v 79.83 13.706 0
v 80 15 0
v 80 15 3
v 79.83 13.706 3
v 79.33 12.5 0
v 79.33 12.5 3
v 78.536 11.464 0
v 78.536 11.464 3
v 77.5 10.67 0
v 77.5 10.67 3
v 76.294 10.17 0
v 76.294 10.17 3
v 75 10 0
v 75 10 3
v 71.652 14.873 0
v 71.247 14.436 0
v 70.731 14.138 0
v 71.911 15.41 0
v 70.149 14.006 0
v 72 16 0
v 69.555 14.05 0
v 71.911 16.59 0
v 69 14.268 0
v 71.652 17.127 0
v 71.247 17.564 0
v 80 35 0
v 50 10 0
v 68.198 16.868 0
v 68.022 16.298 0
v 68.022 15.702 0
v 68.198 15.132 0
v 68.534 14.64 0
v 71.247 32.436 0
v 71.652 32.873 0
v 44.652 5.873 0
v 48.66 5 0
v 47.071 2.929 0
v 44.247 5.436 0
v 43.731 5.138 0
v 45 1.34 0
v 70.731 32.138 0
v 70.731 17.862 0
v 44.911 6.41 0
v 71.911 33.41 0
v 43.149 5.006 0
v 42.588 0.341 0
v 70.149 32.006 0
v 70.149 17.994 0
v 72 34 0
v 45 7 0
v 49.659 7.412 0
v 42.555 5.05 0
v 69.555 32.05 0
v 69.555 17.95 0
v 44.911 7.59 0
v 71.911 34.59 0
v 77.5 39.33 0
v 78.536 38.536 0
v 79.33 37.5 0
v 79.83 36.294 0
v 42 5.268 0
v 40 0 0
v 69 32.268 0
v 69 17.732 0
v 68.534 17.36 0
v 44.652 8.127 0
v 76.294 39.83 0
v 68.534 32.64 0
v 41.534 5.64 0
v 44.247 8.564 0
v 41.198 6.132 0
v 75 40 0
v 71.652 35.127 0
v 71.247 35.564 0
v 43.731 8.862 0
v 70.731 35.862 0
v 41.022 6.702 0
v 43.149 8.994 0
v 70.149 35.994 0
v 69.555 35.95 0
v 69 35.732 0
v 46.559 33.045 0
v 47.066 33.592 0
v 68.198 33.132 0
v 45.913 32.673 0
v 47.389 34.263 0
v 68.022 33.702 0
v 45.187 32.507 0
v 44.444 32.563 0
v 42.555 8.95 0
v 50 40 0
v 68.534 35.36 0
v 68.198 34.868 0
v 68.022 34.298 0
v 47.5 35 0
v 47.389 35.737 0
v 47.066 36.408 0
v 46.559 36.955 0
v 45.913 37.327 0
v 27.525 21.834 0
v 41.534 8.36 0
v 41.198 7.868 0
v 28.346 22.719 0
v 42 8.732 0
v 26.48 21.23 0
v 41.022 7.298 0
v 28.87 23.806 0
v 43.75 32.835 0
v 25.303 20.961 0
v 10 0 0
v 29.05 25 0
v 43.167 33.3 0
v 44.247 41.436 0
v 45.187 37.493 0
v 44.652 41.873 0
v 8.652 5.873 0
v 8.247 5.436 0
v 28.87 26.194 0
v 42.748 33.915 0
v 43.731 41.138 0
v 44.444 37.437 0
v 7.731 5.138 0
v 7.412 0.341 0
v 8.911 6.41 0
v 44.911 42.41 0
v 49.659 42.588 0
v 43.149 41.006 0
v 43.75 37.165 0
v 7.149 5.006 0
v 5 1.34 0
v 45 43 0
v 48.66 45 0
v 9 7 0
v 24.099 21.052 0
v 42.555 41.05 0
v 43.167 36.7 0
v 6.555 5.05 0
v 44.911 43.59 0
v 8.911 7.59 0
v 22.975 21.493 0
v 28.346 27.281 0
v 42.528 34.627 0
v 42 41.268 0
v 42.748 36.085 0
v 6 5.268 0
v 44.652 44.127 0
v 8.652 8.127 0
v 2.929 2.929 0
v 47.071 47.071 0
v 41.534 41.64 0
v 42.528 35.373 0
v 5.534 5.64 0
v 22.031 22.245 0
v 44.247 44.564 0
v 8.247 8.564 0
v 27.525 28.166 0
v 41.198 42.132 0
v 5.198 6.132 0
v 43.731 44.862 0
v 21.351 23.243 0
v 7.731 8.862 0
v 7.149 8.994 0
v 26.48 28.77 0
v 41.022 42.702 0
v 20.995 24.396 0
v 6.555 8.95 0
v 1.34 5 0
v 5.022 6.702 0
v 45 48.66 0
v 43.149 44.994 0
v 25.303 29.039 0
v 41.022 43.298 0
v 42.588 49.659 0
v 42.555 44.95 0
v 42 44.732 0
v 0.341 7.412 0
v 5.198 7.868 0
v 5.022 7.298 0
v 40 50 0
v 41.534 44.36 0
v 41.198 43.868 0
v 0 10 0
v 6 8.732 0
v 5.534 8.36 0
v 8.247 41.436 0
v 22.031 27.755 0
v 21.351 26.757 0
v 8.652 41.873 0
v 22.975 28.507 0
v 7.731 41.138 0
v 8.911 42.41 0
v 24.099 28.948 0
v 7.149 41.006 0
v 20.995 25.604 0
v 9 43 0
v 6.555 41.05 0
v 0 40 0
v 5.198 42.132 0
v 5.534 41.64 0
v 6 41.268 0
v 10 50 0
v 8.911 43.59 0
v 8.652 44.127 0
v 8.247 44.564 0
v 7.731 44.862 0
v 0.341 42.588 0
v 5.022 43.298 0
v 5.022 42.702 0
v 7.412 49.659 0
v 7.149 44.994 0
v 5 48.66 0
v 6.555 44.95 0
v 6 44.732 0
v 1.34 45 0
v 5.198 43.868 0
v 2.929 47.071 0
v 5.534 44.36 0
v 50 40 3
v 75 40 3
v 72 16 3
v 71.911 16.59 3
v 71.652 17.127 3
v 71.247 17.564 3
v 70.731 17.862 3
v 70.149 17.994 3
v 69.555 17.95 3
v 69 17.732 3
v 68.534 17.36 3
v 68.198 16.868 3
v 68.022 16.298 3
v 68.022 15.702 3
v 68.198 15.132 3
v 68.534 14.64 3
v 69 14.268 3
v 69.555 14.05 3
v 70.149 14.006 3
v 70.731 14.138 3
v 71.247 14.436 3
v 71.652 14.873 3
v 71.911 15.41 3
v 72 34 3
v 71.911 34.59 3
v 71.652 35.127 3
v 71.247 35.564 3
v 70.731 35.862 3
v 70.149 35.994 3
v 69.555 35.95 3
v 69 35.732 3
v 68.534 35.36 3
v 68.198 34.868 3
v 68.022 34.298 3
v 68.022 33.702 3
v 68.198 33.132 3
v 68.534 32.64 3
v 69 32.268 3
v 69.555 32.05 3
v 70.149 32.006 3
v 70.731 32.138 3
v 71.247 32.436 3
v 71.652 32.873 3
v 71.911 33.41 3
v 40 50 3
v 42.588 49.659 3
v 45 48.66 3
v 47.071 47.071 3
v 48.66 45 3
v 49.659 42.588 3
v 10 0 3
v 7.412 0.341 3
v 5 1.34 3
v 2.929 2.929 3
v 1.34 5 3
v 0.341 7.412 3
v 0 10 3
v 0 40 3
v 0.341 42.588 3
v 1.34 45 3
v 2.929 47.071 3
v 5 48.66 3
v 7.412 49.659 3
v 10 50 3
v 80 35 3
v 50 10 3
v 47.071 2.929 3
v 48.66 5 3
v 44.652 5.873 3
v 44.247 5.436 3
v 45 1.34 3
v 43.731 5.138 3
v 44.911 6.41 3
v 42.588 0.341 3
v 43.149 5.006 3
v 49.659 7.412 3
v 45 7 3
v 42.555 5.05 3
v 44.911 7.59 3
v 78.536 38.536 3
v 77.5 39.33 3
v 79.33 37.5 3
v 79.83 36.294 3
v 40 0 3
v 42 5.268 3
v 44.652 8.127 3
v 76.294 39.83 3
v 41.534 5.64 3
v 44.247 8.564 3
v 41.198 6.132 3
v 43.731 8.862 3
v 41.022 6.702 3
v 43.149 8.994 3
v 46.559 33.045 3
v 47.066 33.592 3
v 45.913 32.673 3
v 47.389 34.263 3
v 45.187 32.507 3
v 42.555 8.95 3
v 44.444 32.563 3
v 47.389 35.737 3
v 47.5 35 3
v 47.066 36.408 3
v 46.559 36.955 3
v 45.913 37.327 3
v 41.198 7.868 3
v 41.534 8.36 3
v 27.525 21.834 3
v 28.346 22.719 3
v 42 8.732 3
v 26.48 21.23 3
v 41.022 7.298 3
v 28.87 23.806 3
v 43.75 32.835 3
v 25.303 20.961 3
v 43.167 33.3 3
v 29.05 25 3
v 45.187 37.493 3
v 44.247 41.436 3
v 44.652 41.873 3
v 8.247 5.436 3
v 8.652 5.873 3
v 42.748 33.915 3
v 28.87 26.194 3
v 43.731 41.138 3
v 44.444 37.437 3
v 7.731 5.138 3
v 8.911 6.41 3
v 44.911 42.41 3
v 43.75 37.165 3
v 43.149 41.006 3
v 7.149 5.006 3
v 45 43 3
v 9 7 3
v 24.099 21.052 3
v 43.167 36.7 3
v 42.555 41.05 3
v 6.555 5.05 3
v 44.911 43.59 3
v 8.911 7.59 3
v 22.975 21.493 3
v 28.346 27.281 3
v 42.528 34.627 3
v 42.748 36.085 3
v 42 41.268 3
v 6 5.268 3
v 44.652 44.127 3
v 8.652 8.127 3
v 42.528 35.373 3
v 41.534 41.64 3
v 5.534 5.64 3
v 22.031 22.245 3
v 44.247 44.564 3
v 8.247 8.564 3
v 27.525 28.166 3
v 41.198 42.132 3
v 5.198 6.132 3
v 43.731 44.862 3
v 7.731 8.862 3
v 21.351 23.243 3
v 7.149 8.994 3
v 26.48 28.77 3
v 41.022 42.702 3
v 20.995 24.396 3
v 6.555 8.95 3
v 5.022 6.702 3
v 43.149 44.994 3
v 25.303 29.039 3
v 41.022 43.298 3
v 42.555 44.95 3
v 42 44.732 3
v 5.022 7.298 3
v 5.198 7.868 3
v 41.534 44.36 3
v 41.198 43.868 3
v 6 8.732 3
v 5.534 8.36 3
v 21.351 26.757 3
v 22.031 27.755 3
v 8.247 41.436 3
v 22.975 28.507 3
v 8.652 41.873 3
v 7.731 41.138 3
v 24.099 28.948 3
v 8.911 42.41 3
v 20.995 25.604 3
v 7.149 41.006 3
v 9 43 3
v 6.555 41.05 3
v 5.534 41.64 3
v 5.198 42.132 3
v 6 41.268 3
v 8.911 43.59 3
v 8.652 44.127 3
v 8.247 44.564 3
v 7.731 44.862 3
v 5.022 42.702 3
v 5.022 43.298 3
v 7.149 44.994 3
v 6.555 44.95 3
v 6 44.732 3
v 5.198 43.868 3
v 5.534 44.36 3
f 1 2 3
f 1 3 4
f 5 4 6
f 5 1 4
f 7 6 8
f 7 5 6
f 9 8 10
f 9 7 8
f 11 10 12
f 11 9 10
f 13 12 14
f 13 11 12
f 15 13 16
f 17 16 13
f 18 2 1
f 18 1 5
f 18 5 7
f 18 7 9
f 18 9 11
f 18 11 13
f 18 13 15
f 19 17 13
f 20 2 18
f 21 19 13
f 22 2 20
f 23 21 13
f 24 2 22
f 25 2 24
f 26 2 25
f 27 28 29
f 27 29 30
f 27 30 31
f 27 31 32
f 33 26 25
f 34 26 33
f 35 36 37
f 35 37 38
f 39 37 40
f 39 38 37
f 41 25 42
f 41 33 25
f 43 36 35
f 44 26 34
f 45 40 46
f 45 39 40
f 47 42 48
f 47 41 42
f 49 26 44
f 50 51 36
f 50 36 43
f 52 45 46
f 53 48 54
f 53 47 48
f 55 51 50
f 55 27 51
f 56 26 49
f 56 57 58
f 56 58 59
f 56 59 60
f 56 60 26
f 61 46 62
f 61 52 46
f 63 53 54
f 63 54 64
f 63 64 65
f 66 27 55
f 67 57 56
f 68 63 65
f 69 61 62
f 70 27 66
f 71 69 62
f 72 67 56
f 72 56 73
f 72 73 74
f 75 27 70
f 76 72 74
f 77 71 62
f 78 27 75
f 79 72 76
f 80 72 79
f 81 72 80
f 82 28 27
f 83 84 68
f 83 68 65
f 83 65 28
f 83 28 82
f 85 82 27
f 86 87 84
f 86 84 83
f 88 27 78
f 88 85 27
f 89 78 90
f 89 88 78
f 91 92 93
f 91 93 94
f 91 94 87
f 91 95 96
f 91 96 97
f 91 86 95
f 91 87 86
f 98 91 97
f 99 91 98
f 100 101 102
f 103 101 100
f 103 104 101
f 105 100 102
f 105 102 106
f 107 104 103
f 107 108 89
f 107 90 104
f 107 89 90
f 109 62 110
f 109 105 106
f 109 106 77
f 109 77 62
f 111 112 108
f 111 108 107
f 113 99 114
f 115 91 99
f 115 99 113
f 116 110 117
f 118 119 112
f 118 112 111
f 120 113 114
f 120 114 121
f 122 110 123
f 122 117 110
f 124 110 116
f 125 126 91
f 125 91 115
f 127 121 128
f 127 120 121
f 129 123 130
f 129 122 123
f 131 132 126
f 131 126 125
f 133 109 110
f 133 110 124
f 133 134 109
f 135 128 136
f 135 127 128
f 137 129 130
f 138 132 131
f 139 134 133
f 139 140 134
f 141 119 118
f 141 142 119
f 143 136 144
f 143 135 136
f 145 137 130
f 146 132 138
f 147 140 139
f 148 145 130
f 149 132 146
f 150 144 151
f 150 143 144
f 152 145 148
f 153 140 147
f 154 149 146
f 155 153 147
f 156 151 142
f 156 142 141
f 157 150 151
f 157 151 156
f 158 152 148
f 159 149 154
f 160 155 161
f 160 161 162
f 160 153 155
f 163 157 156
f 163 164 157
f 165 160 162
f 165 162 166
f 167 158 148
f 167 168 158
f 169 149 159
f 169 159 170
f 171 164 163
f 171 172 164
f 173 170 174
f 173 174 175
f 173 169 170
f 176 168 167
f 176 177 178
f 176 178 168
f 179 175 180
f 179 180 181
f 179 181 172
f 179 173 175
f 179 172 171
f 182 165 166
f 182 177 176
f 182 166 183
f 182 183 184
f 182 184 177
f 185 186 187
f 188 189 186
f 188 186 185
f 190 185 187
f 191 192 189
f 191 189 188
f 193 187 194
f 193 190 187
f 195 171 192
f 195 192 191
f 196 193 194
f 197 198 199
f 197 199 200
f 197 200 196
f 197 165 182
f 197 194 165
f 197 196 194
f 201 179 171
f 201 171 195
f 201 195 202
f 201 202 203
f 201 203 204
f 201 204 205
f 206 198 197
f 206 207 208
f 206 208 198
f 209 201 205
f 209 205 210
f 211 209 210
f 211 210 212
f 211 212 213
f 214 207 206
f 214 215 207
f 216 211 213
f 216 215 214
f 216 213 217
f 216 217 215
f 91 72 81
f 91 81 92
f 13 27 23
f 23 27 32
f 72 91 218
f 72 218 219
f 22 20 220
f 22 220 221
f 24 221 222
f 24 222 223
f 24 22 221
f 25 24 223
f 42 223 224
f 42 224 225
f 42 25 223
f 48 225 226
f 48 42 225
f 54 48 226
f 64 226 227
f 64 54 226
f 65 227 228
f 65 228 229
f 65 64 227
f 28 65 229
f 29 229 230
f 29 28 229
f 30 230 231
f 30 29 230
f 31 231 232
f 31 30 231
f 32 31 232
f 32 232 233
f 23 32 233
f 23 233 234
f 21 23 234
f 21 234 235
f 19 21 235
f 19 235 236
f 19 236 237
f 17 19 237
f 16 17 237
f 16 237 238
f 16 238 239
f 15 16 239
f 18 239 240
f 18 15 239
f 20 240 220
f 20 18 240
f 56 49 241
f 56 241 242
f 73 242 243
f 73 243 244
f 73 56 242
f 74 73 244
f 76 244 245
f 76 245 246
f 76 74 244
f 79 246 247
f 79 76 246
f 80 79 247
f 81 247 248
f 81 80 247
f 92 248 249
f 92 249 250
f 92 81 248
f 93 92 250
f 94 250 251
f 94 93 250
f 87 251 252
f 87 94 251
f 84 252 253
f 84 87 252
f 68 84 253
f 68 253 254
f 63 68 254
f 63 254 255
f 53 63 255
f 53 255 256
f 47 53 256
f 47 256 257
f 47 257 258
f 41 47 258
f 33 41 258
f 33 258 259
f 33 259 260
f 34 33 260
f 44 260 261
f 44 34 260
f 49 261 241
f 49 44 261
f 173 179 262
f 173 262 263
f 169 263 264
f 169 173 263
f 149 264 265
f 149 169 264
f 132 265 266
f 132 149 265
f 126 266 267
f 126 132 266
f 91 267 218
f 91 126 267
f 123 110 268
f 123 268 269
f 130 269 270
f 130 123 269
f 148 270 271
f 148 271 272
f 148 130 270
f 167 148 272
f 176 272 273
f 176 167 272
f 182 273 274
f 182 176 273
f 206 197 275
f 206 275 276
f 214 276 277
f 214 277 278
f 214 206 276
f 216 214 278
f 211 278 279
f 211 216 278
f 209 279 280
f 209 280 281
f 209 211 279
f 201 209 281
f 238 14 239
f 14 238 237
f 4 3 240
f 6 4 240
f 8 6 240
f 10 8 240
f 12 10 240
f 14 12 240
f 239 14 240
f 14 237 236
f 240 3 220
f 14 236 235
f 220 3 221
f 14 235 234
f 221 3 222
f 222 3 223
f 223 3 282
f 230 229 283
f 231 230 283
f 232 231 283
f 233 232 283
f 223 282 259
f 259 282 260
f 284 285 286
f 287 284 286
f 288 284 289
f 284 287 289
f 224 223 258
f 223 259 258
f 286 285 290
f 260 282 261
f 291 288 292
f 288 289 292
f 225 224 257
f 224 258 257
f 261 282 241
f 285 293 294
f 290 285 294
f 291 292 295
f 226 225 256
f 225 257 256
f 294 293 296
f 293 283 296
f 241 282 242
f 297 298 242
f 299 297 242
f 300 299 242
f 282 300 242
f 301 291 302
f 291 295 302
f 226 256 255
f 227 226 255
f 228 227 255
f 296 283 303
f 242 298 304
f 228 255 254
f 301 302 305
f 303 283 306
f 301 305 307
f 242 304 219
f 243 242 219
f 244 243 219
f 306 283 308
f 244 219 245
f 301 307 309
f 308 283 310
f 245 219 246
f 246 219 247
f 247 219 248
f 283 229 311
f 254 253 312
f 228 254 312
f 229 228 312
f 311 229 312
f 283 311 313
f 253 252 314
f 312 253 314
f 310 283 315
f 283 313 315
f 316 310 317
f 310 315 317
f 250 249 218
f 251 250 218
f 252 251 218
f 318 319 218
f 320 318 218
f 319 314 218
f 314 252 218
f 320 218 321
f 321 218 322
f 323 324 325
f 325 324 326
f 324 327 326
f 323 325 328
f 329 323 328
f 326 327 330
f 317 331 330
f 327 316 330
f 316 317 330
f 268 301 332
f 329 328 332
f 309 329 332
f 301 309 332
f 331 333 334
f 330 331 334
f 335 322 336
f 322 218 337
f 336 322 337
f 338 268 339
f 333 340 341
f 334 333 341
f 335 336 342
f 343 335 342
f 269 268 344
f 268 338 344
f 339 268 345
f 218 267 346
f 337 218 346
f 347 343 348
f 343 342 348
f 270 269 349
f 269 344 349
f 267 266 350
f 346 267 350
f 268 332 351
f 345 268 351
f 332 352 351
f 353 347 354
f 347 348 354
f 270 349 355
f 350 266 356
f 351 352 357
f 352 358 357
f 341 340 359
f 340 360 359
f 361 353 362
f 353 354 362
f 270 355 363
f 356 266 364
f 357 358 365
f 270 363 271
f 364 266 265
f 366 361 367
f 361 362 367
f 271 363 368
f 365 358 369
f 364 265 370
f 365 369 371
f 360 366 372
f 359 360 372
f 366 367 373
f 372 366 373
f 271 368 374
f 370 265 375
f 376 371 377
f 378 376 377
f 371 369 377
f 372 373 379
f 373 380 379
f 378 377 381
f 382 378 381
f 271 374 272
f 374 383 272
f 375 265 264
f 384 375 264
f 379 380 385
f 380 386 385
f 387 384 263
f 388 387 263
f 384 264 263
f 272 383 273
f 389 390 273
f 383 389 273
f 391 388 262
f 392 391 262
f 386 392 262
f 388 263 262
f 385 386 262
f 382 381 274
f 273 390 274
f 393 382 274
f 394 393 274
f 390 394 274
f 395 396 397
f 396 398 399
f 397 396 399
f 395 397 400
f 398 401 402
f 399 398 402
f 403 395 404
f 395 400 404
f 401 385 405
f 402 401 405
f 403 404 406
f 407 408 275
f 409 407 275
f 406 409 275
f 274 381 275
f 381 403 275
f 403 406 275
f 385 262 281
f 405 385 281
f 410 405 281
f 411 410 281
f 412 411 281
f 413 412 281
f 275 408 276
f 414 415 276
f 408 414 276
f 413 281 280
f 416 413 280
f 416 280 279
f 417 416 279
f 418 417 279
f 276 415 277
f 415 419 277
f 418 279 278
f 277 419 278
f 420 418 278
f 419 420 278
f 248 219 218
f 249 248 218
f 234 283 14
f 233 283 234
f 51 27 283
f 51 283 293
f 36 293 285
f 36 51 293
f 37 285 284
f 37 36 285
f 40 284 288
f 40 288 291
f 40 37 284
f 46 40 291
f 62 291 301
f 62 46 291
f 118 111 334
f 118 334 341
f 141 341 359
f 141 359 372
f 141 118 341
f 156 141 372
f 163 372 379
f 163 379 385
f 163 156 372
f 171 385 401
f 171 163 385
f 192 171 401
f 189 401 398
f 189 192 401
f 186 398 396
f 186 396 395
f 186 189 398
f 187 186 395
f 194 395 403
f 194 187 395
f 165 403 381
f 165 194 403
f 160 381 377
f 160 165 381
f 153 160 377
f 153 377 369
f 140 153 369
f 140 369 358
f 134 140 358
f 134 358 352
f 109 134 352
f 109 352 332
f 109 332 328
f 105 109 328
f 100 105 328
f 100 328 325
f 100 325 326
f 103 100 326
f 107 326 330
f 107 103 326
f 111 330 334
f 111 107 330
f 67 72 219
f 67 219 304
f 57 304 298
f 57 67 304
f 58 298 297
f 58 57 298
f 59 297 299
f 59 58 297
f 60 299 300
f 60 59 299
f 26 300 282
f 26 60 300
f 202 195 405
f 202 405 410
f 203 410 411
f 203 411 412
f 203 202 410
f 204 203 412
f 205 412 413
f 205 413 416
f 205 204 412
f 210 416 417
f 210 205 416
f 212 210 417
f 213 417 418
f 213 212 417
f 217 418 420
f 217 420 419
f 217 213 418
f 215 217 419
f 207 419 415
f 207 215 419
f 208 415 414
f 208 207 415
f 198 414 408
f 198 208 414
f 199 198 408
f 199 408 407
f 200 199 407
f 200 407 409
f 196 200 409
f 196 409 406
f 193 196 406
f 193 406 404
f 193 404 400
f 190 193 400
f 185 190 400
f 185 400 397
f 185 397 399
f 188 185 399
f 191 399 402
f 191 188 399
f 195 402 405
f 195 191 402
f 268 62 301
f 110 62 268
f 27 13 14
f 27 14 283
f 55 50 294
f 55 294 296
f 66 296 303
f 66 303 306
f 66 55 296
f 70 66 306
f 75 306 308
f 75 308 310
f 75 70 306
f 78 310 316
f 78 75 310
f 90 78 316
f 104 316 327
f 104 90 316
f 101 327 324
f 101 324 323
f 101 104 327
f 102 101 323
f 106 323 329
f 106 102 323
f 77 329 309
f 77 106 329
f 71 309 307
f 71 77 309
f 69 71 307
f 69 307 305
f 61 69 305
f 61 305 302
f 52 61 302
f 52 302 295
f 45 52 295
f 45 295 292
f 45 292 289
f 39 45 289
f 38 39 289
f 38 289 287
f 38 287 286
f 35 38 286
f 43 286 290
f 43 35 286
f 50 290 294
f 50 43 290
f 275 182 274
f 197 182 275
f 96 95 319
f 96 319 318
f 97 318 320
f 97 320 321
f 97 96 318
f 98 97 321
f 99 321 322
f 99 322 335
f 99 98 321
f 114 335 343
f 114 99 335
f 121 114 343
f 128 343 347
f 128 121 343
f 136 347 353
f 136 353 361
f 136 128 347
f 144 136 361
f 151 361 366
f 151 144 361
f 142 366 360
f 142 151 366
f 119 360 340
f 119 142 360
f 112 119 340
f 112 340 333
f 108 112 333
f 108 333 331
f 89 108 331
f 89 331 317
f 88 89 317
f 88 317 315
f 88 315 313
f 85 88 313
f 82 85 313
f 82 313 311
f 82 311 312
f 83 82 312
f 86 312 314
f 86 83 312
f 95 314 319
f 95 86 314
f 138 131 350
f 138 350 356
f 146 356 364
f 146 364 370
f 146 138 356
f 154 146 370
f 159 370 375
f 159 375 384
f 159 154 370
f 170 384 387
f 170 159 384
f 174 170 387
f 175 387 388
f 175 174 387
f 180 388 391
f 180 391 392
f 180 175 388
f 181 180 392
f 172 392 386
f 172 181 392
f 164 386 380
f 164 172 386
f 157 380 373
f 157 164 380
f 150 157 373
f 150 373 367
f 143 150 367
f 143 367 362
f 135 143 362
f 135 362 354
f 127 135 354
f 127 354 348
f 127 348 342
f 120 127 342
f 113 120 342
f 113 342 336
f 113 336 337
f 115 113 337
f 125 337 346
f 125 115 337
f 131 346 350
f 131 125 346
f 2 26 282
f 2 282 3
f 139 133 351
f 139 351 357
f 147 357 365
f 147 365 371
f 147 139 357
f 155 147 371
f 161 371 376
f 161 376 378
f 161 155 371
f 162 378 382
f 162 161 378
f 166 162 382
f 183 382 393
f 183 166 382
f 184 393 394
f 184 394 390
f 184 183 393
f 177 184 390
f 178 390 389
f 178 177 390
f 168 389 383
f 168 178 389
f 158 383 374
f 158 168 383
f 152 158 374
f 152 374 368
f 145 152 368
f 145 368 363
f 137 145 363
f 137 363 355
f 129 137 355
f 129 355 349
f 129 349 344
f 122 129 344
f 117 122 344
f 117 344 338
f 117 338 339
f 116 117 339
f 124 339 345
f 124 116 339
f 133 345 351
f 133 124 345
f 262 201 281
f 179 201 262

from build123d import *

# Parameters (mm, degrees)
CROQUIS1_R              = 2.5
CROQUIS1_R_2            = 4.05
CROQUIS1_R_3            = 2
SALIENTE_EXTRUIR1_DEPTH = 3


with BuildPart() as part:
    # Croquis1 → Saliente-Extruir1 (new body)
    with BuildSketch(Plane.XY):
        with BuildLine():
            ThreePointArc((0, 40), (2.928932188, 47.071067812), (10, 50))
            Line((10, 50), (40, 50))
            ThreePointArc((40, 50), (47.071067812, 47.071067812), (50, 40))
            Line((50, 40), (50, 10))
            ThreePointArc((50, 10), (47.071067812, 2.928932188), (40, 0))
            Line((40, 0), (10, 0))
            ThreePointArc((10, 0), (2.928932188, 2.928932188), (0, 10))
            Line((0, 10), (0, 40))
        make_face()
        with Locations((45, 35)):
            Circle(CROQUIS1_R, mode=Mode.SUBTRACT)
        with Locations((25, 25)):
            Circle(CROQUIS1_R_2, mode=Mode.SUBTRACT)
        with Locations((43, 43)):
            Circle(CROQUIS1_R_3, mode=Mode.SUBTRACT)
        with Locations((7, 43)):
            Circle(CROQUIS1_R_3, mode=Mode.SUBTRACT)
        with Locations((43, 7)):
            Circle(CROQUIS1_R_3, mode=Mode.SUBTRACT)
        with Locations((7, 7)):
            Circle(CROQUIS1_R_3, mode=Mode.SUBTRACT)
        with BuildLine():
            ThreePointArc((75, 40), (78.535533906, 38.535533906), (80, 35))
            Line((80, 35), (80, 15))
            ThreePointArc((80, 15), (78.535533906, 11.464466094), (75, 10))
            Line((75, 10), (50, 10))
            Line((50, 10), (50, 40))
            Line((50, 40), (75, 40))
        make_face()
        with Locations((70, 16)):
            Circle(CROQUIS1_R_3, mode=Mode.SUBTRACT)
        with Locations((70, 34)):
            Circle(CROQUIS1_R_3, mode=Mode.SUBTRACT)
    extrude(amount=SALIENTE_EXTRUIR1_DEPTH)


solid = part.part
